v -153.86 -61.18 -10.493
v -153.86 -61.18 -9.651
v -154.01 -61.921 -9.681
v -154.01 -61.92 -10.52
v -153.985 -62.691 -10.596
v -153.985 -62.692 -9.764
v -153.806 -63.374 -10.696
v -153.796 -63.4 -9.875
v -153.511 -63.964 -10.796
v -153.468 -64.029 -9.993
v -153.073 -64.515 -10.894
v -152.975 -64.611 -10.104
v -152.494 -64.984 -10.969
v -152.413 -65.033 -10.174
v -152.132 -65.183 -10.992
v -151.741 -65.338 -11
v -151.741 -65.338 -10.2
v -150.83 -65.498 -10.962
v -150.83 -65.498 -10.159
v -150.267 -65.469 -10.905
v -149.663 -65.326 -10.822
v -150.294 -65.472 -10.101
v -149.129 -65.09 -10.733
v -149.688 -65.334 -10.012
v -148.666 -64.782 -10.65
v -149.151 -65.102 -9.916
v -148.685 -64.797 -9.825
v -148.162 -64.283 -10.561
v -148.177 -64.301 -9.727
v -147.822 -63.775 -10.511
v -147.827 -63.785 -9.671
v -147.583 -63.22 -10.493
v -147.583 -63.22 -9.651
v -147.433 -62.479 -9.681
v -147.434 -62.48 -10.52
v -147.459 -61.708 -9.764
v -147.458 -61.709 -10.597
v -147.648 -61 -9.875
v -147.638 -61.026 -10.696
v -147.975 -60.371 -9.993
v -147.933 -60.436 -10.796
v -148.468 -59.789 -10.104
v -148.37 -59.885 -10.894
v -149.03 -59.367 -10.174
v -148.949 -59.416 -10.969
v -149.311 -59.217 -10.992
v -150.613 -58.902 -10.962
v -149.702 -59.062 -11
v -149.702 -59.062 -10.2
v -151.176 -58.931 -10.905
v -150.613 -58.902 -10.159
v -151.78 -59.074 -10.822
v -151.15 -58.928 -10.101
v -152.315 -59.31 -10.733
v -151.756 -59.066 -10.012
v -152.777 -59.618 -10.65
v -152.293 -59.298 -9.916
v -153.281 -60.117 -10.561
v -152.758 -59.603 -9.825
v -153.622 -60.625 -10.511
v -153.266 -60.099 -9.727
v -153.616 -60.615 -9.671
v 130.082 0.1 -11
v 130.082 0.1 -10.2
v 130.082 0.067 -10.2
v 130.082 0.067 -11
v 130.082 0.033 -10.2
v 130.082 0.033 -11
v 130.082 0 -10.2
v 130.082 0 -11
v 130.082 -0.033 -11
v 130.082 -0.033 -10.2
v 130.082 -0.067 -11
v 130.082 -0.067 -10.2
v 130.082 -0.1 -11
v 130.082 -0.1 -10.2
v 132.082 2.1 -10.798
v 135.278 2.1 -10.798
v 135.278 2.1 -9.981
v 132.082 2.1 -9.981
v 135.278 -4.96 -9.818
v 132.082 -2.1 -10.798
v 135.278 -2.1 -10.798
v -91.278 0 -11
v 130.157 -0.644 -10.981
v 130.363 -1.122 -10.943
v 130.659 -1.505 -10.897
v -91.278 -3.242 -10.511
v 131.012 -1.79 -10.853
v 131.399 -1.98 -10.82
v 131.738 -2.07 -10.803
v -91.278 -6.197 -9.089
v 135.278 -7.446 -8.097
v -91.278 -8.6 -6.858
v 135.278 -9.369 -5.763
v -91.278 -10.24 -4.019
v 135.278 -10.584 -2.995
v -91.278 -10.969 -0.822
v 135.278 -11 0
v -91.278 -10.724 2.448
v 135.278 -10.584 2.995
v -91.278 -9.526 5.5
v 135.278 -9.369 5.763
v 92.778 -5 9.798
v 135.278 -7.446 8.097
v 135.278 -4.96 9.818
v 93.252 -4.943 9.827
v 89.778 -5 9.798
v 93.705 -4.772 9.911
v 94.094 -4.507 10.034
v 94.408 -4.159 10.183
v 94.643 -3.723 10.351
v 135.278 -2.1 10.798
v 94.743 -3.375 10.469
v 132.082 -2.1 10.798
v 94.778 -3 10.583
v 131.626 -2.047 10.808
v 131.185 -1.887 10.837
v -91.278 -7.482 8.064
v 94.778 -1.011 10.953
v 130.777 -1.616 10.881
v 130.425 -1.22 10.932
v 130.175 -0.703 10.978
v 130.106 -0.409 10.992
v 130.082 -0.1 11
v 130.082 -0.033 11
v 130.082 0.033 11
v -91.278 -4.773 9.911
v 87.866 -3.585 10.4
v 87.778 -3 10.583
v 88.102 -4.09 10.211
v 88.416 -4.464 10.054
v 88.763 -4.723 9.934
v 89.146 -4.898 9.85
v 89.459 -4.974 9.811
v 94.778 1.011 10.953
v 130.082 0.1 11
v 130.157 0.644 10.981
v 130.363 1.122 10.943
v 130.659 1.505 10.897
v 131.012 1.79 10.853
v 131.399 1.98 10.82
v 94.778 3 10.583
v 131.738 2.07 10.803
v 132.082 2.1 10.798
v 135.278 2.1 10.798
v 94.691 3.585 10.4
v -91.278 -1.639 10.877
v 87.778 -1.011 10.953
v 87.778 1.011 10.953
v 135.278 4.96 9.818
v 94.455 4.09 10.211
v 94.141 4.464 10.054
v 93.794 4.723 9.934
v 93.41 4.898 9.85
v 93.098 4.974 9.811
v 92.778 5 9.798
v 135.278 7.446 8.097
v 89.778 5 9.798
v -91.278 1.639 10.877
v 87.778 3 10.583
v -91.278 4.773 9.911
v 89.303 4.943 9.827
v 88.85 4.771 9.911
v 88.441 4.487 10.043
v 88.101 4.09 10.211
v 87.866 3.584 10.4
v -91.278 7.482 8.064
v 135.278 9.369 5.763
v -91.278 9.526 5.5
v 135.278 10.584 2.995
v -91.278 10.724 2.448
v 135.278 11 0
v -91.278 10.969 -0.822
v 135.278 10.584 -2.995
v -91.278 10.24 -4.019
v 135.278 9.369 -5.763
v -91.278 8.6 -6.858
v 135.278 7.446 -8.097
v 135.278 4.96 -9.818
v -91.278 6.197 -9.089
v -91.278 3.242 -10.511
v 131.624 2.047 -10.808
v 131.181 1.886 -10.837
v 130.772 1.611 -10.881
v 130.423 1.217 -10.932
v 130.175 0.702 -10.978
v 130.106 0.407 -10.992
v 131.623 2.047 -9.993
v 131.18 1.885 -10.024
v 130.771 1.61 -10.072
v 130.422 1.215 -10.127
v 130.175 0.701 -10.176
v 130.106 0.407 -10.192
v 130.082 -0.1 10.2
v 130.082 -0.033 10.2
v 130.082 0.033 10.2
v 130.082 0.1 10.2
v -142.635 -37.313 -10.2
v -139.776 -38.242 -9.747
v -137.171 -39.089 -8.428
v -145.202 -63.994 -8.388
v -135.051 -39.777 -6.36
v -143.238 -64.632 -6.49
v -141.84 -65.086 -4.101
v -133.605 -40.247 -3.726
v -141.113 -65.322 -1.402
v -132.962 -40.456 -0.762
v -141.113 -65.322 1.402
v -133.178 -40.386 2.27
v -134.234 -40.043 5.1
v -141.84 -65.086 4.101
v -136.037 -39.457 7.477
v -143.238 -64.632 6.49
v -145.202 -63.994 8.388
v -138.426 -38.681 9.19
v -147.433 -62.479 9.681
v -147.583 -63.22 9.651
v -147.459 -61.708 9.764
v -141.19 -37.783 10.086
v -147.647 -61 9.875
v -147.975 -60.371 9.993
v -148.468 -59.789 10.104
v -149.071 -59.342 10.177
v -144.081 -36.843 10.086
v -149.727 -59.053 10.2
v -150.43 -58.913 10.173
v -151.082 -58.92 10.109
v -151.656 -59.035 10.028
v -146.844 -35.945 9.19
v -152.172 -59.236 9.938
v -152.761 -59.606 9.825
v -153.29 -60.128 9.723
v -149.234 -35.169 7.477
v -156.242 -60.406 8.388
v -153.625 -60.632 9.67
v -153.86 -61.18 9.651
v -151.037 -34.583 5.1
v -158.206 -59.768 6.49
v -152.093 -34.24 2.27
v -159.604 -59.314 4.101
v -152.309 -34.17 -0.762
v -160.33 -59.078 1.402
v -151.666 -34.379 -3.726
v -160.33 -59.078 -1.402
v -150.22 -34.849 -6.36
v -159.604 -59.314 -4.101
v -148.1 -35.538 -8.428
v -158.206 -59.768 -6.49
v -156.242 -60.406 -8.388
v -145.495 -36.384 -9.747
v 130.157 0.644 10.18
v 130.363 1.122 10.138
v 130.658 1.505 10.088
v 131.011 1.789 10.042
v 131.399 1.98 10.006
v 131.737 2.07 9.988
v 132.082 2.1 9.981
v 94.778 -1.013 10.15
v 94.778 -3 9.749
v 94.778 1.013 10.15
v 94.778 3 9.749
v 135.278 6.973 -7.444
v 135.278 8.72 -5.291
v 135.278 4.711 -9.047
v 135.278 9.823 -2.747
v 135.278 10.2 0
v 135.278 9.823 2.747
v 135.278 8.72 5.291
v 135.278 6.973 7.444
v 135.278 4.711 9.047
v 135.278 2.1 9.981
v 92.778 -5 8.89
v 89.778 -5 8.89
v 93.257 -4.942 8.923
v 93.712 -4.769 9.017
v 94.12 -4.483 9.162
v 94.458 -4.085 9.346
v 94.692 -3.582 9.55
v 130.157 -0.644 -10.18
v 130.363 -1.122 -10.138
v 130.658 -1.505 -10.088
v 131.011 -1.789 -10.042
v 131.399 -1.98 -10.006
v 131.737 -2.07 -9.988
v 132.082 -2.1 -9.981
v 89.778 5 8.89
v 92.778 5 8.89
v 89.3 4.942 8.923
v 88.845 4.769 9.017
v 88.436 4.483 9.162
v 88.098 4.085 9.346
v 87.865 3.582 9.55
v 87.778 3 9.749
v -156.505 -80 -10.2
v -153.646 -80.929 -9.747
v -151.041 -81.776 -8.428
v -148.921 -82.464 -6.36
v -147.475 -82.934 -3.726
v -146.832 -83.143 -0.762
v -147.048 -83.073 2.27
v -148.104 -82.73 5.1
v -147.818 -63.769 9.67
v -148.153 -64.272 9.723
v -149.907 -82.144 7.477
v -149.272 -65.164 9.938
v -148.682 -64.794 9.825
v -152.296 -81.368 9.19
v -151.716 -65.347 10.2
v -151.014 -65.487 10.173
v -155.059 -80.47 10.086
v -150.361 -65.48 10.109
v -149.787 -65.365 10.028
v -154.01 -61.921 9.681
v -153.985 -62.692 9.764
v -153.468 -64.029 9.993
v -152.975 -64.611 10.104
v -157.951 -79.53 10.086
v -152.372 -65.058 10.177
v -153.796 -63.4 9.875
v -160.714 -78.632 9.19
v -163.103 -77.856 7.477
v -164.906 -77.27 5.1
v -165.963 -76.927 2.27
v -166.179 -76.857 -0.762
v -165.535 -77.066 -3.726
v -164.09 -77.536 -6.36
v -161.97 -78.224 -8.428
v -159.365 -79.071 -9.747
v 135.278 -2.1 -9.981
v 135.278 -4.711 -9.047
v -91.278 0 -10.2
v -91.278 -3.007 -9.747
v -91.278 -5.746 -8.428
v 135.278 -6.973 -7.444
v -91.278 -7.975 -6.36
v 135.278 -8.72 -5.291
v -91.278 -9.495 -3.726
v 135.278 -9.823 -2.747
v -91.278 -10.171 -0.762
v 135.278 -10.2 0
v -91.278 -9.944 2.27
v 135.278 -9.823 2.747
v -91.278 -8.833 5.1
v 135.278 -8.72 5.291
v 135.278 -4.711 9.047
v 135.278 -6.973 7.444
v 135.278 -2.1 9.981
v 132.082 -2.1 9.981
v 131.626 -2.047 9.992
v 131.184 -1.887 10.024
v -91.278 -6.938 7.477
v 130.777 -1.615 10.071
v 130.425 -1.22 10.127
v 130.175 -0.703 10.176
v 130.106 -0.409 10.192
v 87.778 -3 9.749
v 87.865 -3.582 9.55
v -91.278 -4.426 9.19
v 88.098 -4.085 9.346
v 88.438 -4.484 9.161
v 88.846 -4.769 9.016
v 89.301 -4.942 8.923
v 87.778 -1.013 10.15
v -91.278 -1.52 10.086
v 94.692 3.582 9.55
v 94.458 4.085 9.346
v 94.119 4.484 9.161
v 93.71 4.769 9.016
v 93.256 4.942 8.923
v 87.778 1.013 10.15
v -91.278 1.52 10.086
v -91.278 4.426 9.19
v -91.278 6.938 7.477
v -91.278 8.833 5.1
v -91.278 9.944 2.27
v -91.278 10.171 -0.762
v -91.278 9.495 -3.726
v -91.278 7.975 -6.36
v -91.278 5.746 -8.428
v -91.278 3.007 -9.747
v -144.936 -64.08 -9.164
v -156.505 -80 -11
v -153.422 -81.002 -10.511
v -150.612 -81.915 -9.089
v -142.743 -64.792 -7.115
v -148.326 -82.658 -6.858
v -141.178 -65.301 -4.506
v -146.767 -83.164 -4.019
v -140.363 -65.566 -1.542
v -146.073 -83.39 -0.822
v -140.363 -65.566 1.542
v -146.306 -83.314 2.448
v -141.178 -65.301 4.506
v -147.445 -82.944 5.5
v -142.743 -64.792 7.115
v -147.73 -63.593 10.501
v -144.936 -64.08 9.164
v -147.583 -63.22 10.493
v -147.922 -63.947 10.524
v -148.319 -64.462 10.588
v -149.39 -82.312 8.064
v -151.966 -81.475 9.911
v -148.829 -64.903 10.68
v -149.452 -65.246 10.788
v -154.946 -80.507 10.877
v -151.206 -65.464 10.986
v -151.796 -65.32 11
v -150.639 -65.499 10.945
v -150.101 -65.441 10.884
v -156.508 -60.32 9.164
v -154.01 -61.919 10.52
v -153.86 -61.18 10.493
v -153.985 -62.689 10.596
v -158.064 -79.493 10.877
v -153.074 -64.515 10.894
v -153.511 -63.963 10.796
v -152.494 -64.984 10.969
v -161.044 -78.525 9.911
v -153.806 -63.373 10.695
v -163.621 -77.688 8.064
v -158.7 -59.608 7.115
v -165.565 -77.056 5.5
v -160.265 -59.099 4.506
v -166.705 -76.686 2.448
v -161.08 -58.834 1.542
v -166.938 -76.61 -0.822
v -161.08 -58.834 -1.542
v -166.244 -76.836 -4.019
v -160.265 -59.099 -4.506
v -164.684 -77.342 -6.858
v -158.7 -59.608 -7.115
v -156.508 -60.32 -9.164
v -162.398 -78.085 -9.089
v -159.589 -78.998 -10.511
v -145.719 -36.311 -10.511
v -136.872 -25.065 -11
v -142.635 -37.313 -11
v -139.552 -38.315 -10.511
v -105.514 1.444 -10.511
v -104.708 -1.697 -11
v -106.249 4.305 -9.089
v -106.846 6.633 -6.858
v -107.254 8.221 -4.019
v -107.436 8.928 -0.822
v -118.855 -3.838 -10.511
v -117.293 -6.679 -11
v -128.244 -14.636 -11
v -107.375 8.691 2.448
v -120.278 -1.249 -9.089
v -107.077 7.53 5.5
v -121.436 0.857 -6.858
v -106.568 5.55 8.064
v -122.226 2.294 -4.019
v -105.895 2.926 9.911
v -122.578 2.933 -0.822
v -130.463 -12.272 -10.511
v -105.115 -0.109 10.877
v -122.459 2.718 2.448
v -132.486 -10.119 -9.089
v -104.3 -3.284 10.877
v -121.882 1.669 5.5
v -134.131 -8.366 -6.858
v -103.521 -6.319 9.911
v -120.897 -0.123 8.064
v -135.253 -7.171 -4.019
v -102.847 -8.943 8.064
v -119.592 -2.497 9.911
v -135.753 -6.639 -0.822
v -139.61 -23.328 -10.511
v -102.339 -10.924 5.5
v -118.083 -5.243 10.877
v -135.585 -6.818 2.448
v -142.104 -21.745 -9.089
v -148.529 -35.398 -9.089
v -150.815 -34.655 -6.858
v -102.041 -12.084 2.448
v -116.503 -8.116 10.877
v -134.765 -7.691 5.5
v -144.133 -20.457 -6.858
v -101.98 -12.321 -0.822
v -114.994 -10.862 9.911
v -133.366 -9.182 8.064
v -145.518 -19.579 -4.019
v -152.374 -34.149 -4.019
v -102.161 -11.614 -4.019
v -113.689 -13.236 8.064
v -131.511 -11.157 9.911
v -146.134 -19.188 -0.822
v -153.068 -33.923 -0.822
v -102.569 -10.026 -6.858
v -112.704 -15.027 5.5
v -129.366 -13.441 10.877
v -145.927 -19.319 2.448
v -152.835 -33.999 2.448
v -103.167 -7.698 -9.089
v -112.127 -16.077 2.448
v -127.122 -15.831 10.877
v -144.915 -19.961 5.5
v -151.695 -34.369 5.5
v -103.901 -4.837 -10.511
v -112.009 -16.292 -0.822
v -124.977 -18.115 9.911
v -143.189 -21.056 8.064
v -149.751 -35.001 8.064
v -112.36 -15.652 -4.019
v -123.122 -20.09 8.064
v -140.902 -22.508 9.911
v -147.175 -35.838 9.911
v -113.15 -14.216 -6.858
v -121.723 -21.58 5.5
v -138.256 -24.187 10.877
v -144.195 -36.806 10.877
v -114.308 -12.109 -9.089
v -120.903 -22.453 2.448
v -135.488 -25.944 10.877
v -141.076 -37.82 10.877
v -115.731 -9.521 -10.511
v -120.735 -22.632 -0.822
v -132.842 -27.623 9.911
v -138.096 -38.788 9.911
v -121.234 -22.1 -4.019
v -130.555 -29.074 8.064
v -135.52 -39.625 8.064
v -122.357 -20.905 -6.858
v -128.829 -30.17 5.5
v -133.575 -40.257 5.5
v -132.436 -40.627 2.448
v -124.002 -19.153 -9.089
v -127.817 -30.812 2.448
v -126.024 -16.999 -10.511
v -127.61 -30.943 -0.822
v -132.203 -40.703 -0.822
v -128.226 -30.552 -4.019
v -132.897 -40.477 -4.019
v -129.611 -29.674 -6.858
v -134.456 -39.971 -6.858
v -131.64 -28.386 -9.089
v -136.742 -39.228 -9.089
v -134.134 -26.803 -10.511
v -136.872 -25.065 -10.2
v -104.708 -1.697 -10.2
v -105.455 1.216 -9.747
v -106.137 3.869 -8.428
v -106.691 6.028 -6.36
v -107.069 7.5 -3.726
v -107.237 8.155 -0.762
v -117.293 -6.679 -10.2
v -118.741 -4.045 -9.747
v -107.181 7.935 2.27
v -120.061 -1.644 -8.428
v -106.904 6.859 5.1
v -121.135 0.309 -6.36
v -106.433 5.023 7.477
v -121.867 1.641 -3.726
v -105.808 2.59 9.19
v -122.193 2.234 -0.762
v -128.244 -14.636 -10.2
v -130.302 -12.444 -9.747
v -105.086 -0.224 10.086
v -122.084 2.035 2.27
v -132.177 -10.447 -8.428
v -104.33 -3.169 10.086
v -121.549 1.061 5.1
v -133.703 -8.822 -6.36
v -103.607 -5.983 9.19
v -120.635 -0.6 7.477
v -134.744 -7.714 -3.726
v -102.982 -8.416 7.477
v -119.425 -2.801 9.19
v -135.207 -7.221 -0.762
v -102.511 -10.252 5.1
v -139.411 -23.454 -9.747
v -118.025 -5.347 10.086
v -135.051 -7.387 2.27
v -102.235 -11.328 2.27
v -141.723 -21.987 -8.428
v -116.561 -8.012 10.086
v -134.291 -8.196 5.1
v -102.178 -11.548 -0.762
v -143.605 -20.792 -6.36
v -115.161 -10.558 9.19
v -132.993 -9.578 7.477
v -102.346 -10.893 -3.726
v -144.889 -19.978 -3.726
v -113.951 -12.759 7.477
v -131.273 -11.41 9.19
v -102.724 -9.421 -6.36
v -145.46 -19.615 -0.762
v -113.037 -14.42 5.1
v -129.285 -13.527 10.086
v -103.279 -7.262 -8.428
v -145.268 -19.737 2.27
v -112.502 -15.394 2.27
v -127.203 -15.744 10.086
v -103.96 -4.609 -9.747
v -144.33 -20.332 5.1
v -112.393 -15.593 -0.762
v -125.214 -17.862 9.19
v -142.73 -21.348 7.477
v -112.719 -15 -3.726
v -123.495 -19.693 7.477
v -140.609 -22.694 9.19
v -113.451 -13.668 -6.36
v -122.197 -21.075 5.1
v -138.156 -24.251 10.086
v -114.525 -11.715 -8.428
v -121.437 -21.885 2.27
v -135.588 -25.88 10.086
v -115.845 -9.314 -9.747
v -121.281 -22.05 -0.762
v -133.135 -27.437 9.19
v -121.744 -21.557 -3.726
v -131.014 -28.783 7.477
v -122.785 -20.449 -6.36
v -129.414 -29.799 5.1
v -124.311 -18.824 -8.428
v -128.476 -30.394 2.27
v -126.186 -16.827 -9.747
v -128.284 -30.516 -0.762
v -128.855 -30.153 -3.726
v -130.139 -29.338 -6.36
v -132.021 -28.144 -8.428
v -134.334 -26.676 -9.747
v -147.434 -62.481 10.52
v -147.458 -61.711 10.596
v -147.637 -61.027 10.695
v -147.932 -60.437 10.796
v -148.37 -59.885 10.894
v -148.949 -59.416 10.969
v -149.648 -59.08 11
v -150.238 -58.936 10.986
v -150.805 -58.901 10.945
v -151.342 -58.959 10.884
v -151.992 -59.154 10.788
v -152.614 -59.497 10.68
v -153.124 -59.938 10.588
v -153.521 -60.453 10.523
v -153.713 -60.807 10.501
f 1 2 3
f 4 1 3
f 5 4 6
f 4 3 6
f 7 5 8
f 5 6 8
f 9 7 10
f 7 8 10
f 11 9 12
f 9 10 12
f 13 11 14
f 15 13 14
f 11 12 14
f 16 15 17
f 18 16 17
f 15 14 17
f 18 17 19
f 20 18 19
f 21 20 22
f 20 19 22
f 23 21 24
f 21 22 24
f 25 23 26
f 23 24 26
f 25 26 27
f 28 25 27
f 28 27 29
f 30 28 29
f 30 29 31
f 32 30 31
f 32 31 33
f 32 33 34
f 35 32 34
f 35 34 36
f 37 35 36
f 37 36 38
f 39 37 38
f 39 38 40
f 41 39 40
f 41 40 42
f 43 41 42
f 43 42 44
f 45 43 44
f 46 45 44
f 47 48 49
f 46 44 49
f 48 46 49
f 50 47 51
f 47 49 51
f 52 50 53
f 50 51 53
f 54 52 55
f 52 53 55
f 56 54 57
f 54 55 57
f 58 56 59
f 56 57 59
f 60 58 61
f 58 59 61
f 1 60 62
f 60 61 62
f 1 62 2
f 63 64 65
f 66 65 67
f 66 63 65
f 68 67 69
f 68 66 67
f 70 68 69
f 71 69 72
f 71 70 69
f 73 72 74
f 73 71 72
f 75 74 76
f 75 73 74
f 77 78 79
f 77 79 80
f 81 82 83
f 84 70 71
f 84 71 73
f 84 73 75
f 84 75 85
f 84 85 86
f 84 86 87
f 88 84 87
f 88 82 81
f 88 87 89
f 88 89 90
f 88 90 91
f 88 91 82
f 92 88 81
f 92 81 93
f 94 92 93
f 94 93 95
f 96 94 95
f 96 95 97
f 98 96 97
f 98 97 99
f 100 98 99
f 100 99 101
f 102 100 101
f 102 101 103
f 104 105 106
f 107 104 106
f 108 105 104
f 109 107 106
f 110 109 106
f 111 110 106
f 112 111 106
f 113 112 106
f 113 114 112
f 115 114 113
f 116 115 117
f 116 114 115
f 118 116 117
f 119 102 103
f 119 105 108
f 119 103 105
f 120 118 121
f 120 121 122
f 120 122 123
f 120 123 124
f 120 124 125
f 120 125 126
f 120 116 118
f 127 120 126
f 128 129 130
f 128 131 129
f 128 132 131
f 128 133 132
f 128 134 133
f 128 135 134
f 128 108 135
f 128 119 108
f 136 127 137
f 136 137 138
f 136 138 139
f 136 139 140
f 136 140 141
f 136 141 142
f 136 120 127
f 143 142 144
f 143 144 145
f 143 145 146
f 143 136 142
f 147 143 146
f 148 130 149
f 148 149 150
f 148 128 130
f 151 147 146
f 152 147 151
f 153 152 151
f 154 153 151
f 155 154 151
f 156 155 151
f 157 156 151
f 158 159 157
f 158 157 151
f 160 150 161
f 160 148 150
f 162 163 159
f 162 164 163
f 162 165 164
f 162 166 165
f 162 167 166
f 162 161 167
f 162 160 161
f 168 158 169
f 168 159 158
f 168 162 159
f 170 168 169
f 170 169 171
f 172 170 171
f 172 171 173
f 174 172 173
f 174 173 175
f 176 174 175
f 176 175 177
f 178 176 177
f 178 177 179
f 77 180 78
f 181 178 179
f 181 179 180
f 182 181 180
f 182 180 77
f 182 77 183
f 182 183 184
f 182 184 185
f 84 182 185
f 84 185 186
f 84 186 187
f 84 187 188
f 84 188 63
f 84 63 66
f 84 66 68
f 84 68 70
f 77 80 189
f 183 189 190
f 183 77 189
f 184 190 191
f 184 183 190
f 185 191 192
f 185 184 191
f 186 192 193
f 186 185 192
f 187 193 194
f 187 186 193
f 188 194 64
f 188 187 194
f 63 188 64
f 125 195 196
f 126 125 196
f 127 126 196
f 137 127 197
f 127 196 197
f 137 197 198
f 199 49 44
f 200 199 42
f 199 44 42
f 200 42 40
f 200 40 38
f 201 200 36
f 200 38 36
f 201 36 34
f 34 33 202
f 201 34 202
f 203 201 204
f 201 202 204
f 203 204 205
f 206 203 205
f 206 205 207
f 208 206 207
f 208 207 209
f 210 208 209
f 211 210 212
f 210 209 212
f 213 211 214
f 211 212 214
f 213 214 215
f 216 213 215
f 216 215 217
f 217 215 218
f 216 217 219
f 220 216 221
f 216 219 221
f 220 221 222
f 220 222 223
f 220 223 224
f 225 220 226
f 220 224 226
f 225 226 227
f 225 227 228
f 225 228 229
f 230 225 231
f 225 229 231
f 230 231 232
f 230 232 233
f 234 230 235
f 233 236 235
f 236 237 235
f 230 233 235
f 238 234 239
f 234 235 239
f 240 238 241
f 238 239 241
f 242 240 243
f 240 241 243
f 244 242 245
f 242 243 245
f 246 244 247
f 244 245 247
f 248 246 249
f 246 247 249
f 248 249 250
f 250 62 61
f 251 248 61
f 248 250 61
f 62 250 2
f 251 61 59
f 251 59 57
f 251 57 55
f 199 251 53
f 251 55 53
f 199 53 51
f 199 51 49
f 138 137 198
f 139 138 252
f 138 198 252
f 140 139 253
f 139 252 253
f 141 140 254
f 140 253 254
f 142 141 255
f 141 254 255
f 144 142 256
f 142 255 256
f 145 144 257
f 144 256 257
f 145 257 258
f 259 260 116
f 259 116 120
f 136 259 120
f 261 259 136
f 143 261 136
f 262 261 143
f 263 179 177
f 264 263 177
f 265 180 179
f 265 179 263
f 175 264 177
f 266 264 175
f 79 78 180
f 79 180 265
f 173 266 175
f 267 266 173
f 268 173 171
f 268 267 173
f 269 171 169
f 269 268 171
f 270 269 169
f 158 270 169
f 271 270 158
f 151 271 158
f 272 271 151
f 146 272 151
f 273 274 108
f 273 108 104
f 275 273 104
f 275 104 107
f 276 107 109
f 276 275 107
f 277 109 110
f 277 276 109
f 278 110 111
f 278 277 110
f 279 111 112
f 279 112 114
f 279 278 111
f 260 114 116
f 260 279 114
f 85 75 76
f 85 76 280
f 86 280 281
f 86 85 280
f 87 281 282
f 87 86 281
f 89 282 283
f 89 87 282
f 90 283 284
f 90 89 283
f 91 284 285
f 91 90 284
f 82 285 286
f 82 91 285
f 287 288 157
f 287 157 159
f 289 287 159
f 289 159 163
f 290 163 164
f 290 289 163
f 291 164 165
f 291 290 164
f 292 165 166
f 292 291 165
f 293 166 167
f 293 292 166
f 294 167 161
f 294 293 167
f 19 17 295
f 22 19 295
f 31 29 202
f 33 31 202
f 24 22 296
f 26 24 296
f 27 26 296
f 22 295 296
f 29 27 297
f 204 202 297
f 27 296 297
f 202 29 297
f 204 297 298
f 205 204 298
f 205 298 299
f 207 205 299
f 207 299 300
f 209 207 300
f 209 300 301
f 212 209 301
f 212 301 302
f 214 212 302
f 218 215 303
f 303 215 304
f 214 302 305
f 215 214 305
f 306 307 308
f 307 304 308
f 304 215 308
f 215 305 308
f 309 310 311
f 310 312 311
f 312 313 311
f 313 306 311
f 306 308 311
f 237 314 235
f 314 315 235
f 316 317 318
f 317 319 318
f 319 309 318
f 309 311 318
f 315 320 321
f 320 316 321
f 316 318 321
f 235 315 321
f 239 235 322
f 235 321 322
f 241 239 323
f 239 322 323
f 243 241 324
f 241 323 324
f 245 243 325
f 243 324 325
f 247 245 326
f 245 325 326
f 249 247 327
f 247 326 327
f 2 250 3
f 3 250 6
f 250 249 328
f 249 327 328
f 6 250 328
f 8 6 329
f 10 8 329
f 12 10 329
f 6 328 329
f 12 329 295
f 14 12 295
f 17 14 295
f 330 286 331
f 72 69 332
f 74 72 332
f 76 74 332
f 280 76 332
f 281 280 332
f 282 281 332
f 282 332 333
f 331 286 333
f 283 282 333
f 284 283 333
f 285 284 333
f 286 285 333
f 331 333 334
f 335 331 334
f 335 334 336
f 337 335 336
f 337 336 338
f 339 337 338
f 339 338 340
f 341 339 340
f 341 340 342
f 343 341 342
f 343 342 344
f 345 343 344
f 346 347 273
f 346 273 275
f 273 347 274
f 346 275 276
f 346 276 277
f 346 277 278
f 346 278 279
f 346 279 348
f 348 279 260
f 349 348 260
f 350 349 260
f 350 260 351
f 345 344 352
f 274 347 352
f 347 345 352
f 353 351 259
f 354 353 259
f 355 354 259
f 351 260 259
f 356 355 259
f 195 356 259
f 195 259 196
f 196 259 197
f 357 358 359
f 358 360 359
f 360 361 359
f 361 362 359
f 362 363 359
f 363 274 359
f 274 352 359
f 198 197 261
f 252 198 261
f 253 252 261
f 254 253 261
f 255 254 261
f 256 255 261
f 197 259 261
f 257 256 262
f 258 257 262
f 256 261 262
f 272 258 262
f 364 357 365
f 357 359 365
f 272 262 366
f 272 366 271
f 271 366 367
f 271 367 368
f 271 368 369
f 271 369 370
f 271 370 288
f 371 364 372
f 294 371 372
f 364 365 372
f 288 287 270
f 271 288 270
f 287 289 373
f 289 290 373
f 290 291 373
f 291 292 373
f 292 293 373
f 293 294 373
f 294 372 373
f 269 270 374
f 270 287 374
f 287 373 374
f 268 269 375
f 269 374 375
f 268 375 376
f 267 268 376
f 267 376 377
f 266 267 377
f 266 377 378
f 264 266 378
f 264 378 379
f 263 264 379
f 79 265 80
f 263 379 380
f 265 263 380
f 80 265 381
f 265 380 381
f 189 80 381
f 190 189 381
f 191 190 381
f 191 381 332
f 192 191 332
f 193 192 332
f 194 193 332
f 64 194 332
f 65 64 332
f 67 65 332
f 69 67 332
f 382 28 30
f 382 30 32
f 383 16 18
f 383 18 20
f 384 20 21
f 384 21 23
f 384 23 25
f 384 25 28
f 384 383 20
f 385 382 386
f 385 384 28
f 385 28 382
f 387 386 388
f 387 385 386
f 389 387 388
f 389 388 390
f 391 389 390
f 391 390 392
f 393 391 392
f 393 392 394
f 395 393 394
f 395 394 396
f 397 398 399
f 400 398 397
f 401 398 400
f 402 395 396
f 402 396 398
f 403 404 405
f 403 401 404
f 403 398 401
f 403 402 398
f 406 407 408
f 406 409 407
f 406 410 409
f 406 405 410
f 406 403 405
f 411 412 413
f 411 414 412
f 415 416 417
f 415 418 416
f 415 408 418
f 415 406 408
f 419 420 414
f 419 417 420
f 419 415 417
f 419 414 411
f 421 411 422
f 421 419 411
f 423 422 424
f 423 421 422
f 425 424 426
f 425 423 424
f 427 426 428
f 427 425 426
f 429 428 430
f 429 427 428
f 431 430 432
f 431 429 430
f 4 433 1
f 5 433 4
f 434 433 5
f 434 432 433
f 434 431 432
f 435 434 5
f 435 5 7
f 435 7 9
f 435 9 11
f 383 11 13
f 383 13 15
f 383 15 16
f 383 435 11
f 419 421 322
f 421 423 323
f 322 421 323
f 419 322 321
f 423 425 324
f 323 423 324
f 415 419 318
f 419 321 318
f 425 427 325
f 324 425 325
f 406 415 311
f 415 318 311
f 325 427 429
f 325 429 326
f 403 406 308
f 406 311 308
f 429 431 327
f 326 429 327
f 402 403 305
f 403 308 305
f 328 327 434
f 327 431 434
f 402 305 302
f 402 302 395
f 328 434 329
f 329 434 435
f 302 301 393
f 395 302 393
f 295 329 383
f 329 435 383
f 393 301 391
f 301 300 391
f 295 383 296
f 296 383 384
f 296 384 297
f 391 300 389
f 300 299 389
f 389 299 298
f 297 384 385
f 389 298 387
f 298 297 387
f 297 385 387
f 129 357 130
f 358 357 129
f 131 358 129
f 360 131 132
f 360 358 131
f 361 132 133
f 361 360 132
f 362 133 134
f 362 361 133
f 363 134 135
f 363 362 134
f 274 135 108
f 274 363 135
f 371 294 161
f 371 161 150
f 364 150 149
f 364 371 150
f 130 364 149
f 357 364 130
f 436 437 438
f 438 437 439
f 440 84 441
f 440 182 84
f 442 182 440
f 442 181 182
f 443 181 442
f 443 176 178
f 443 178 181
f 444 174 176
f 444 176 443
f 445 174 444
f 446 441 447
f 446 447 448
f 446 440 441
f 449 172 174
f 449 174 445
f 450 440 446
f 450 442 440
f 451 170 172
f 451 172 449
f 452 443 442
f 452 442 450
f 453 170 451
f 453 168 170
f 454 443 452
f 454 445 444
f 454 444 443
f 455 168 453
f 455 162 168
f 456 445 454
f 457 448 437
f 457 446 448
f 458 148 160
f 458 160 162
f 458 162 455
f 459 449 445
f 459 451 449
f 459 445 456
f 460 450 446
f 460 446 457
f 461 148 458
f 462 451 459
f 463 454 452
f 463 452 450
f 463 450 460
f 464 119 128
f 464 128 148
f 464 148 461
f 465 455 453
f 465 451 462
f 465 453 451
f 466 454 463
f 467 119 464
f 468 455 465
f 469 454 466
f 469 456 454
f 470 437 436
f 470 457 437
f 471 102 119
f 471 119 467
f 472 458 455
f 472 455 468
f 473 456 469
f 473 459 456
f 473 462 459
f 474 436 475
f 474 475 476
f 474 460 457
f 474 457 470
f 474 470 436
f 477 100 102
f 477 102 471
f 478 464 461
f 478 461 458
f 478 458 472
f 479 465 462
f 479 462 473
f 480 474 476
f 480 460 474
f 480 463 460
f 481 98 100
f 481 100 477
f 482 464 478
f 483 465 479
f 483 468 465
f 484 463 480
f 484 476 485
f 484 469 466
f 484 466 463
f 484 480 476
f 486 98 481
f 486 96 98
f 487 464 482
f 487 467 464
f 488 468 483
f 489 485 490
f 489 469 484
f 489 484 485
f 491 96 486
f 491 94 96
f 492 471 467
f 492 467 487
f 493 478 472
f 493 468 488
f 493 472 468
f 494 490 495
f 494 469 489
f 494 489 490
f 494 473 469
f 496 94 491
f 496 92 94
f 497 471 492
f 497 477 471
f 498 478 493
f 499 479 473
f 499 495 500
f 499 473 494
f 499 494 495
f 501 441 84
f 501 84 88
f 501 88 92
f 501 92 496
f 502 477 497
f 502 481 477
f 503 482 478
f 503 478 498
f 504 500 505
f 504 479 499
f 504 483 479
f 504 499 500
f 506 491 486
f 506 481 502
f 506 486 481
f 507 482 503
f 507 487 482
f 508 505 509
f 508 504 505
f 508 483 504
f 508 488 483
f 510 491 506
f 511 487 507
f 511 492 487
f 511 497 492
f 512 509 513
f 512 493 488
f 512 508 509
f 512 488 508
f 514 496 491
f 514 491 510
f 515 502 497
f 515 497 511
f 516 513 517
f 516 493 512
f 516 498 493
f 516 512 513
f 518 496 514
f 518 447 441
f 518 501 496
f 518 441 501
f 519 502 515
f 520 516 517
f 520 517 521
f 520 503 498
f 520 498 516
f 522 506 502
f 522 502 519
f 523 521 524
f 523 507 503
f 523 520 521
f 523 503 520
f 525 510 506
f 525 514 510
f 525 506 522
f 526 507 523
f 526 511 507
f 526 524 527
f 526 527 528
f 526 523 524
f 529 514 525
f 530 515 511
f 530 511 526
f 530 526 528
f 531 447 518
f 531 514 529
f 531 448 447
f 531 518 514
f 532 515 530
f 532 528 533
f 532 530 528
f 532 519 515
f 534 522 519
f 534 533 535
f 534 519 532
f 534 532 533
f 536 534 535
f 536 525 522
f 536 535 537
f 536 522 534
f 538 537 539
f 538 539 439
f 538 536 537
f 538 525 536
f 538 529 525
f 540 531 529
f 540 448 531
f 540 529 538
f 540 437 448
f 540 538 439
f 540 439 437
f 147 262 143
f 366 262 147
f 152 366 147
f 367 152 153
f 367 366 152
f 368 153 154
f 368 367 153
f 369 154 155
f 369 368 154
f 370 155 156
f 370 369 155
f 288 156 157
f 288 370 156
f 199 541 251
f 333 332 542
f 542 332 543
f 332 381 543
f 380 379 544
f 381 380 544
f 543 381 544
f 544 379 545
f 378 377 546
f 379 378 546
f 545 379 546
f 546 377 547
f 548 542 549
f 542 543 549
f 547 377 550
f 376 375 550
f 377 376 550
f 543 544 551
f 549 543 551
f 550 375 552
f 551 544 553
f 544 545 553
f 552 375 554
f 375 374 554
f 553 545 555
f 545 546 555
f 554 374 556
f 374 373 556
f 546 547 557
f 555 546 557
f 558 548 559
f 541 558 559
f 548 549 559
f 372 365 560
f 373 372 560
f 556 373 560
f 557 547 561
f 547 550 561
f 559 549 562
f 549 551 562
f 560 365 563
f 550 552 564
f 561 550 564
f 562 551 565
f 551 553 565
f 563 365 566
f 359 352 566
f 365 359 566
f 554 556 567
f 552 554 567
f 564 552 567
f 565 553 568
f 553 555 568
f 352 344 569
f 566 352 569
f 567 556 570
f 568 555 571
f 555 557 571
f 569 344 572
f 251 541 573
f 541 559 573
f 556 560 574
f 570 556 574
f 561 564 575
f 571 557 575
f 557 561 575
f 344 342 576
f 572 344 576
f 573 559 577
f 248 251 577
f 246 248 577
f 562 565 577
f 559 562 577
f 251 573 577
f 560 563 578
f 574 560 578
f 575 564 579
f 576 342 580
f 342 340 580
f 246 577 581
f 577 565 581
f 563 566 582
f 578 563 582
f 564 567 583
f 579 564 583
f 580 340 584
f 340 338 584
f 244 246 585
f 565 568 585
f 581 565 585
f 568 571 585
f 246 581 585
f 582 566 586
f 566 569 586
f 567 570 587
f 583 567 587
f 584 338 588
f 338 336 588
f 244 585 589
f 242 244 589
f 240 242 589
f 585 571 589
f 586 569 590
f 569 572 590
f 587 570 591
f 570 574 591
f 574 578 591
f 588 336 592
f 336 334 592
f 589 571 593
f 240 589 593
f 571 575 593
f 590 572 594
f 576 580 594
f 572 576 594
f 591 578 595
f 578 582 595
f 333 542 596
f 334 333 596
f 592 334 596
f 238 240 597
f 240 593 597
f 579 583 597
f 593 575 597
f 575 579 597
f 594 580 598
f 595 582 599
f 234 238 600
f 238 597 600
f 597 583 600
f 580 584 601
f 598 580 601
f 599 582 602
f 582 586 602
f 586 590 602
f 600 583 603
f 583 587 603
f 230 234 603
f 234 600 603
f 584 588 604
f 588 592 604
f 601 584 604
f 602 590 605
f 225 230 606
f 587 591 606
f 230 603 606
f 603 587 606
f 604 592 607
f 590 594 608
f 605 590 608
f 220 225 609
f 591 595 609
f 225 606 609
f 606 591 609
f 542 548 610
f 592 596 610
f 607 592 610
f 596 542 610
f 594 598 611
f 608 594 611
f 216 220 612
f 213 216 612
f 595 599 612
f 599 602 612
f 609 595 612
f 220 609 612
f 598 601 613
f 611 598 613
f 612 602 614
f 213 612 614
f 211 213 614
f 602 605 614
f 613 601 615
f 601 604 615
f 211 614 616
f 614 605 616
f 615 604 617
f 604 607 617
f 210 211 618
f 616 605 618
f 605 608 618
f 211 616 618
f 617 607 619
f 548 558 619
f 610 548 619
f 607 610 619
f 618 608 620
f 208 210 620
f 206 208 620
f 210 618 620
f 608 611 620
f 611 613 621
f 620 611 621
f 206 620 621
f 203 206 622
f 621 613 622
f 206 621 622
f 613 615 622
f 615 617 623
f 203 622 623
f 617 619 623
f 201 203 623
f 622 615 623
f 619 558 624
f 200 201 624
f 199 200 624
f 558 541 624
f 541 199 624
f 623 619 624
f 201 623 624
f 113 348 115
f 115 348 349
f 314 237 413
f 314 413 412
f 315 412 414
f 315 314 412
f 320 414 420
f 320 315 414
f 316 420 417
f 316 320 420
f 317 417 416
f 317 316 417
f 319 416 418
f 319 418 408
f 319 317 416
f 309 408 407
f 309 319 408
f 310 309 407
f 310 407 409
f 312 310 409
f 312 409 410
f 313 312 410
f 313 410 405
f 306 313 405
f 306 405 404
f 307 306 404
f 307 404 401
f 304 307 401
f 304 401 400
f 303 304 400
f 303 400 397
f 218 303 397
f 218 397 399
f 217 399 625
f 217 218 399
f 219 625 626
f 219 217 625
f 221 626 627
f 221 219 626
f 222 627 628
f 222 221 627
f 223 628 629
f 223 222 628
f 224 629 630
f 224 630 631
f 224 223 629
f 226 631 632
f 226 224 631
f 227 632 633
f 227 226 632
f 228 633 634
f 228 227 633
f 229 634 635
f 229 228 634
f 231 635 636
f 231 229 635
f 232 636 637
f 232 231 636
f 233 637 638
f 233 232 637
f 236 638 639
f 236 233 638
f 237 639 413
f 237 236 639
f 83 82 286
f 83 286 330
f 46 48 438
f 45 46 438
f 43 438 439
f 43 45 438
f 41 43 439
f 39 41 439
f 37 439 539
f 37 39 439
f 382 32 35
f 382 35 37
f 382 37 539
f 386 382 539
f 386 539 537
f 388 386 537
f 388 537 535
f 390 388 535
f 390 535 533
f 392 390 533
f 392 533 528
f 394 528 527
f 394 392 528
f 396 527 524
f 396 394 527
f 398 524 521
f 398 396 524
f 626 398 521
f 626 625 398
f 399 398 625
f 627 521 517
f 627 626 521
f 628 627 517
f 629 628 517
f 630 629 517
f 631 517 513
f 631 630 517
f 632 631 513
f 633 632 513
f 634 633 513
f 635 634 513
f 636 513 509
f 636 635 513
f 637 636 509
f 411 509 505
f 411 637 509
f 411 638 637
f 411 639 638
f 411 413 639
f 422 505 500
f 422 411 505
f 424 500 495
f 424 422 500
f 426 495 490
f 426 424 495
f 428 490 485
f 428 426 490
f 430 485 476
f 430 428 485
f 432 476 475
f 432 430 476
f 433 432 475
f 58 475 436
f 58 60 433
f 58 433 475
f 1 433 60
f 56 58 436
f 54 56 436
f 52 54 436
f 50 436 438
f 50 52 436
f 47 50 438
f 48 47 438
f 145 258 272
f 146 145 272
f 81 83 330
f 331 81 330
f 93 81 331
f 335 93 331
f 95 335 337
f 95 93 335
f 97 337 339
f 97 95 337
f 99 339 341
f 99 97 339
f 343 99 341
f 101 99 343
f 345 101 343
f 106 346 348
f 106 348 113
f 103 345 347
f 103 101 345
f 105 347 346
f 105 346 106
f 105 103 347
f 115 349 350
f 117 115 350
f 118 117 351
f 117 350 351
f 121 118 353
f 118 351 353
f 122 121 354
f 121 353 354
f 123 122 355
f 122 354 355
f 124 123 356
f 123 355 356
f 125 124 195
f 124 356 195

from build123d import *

# Parameters (mm, degrees)
SKETCH3_R               = 11
SKETCH3_R_2             = 10.2
CUT_EXTRUDE1_REACH      = 188.961
SKETCH4_R               = 3.3
SKETCH5_R               = 3.3
CUT_EXTRUDE2_DEPTH      = 187.960827776
CUT_EXTRUDE3_DEPTH      = 187.960827776
CUT_EXTRUDE3_DEPTH_BACK = 187.960827776


with BuildPart() as part:
    # Sweep2: sweep along a path in Sketch1
    with BuildLine(Plane.XY) as sweep2_path:
        Line((135.278349191, 0), (91.278349191, 0))
        Line((91.278349191, 0), (-91.278349191, 0))
        ThreePointArc((-91.278349191, 0), (-123.018752815, -10.313082304), (-142.635401071, -37.313082304))
        Line((-142.635401071, -37.313082304), (-150.721650809, -62.2))
        Line((-150.721650809, -62.2), (-156.505221402, -80))
    # Sketch3 → Sweep2 (sweep)
    with BuildSketch(Plane(origin=(91.278349191, 0, 0), x_dir=(0, 0, -1), z_dir=(1, 0, 0))):
        Circle(SKETCH3_R)
        Circle(SKETCH3_R_2, mode=Mode.SUBTRACT)
    sweep(path=sweep2_path.line)

    # Sketch4 → Cut-Extrude1 (cut, up to next)
    with BuildSketch(Plane.XY, mode=Mode.PRIVATE) as cut_extrude1_sk1:
        with Locations((-150.721650809, -62.2)):
            Circle(SKETCH4_R)
    cut_extrude1_tool1 = extrude(cut_extrude1_sk1.sketch, amount=CUT_EXTRUDE1_REACH, mode=Mode.PRIVATE) & part.part
    # Sketch4 → Cut-Extrude1 (cut, up to next)
    with BuildSketch(Plane.XY, mode=Mode.PRIVATE) as cut_extrude1_sk2:
        with BuildLine():
            Line((135.282015265, 2.1), (135.282015265, -2.1))
            Line((135.282015265, -2.1), (132.082015265, -2.1))
            ThreePointArc((132.082015265, -2.1), (130.667801703, -1.514213562), (130.082015265, -0.1))
            Line((130.082015265, -0.1), (130.082015265, 0.1))
            ThreePointArc((130.082015265, 0.1), (130.667801703, 1.514213562), (132.082015265, 2.1))
            Line((132.082015265, 2.1), (135.282015265, 2.1))
        make_face()
    cut_extrude1_tool2 = extrude(cut_extrude1_sk2.sketch, amount=CUT_EXTRUDE1_REACH, mode=Mode.PRIVATE) & part.part
    # Sketch4 → Cut-Extrude1 (cut, up to next)
    with BuildSketch(Plane.XY, mode=Mode.PRIVATE) as cut_extrude1_sk3:
        with BuildLine():
            Line((89.778349191, -5), (92.778349191, -5))
            ThreePointArc((92.778349191, -5), (94.192562753, -4.414213562), (94.778349191, -3))
            Line((94.778349191, -3), (94.778349191, 3))
            ThreePointArc((94.778349191, 3), (94.192562753, 4.414213562), (92.778349191, 5))
            Line((92.778349191, 5), (89.778349191, 5))
            ThreePointArc((89.778349191, 5), (88.364135629, 4.414213562), (87.778349191, 3))
            Line((87.778349191, 3), (87.778349191, -3))
            ThreePointArc((87.778349191, -3), (88.364135629, -4.414213562), (89.778349191, -5))
        make_face()
    cut_extrude1_tool3 = extrude(cut_extrude1_sk3.sketch, amount=CUT_EXTRUDE1_REACH, mode=Mode.PRIVATE) & part.part
    add(cut_extrude1_tool1.solids().sort_by_distance((-150.721651, -62.2, 0))[0], mode=Mode.SUBTRACT)
    add(cut_extrude1_tool2.solids().sort_by_distance((132.865722, 0, 0))[0], mode=Mode.SUBTRACT)
    add(cut_extrude1_tool3.solids().sort_by_distance((91.278349, 0, 0))[0], mode=Mode.SUBTRACT)

    # Sketch5 → Cut-Extrude2 (cut, through all)
    with BuildSketch(Plane.XY):
        with Locations((-150.721650809, -62.2)):
            Circle(SKETCH5_R)
    extrude(amount=-CUT_EXTRUDE2_DEPTH, mode=Mode.SUBTRACT)

    # Sketch6 → Cut-Extrude3 (cut, two sides: drawn at the far end of the back side and taken through both)
    with BuildSketch(Plane.XY.offset(-CUT_EXTRUDE3_DEPTH_BACK)):
        with BuildLine():
            Line((130.082015265, 0.1), (130.082015265, -0.1))
            ThreePointArc((130.082015265, -0.1), (130.667801703, -1.514213562), (132.082015265, -2.1))
            Line((132.082015265, -2.1), (135.278349191, -2.1))
            Line((135.278349191, -2.1), (135.278349191, 2.1))
            Line((135.278349191, 2.1), (132.082015265, 2.1))
            ThreePointArc((132.082015265, 2.1), (130.667801703, 1.514213562), (130.082015265, 0.1))
        make_face()
    extrude(amount=CUT_EXTRUDE3_DEPTH + CUT_EXTRUDE3_DEPTH_BACK, mode=Mode.SUBTRACT)


solid = part.part
